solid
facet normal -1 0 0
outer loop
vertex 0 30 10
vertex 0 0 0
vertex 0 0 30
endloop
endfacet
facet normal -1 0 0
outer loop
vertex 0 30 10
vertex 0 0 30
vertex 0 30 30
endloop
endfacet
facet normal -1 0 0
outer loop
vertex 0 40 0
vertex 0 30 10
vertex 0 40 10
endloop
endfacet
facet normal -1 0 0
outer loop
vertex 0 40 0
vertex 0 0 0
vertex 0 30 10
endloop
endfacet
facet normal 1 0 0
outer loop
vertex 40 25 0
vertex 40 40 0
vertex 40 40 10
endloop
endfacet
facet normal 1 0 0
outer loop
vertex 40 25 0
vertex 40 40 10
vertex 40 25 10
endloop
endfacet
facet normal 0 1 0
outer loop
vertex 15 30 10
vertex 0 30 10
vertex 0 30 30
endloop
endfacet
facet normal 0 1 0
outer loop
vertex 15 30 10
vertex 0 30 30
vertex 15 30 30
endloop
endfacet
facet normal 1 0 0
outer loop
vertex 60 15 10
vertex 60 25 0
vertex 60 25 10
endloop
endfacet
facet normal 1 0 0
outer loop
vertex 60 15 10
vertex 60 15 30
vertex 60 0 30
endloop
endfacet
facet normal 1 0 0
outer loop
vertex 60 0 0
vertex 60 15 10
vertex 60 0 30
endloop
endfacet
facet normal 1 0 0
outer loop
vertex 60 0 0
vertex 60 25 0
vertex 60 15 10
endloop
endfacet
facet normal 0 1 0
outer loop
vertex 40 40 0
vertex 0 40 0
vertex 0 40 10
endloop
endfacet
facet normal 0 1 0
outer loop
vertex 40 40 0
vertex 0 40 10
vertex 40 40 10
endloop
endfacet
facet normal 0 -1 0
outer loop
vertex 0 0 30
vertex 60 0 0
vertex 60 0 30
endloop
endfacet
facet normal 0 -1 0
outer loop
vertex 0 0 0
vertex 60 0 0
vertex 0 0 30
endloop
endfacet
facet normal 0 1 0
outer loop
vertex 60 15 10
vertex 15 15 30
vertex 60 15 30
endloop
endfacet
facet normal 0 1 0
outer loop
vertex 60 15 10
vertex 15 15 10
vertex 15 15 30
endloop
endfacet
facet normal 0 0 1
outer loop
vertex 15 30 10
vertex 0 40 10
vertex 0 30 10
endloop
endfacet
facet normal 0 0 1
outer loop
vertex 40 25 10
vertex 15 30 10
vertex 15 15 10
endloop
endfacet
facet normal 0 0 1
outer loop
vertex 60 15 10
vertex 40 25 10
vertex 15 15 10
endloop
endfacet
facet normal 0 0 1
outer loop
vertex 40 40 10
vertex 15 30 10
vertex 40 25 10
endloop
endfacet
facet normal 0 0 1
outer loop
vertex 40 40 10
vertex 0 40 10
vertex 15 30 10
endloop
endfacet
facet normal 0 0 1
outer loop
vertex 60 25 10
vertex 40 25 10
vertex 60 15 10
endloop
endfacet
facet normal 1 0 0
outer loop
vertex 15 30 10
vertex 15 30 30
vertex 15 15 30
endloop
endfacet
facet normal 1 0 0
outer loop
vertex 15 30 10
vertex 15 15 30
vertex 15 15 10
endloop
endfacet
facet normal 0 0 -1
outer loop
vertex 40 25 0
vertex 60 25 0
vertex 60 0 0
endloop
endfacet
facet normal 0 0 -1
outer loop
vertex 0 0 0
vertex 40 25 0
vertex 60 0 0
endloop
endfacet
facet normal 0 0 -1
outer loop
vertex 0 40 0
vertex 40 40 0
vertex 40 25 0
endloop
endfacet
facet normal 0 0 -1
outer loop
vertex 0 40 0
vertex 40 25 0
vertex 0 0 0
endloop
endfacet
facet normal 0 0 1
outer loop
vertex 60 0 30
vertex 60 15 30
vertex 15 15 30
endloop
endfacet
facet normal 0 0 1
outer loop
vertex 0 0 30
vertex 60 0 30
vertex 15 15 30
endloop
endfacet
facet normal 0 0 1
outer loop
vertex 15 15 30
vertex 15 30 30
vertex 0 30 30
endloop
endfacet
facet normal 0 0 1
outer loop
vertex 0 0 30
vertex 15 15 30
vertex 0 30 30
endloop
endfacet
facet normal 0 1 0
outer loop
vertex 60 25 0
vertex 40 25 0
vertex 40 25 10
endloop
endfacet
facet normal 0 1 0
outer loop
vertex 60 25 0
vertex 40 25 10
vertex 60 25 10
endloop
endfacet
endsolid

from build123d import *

# Parameters (mm, degrees)
RESSALTO_EXTRUS_O1_DEPTH = 30
ESBO_O2_W                = 25
ESBO_O2_H                = 20
CORTE_EXTRUS_O1_DEPTH    = 25
ESBO_O3_W                = 20
ESBO_O3_H                = 20
CORTE_EXTRUS_O2_DEPTH    = 10
ESBO_O4_W                = 15
ESBO_O4_H                = 20
CORTE_EXTRUS_O3_DEPTH    = 10


with BuildPart() as part:
    # Esboço1 → Ressalto-extrusão1 (new body)
    with BuildSketch(Plane.XY):
        Polygon((0, 0), (0, 40), (40, 40), (40, 25), (60, 25), (60, 0), align=None)
    extrude(amount=RESSALTO_EXTRUS_O1_DEPTH)

    # Esboço2 → Corte-extrusão1 (cut)
    with BuildSketch(Plane(origin=(0, 40, 0), x_dir=(1, 0, 0), z_dir=(0, 1, 0))):
        with Locations((27.5, -20)):
            Rectangle(ESBO_O2_W, ESBO_O2_H)
    extrude(amount=-CORTE_EXTRUS_O1_DEPTH, mode=Mode.SUBTRACT)

    # Esboço3 → Corte-extrusão2 (cut)
    with BuildSketch(Plane(origin=(0, 25, 0), x_dir=(1, 0, 0), z_dir=(0, 1, 0))):
        with Locations((50, -20)):
            Rectangle(ESBO_O3_W, ESBO_O3_H)
    extrude(amount=-CORTE_EXTRUS_O2_DEPTH, mode=Mode.SUBTRACT)

    # Esboço4 → Corte-extrusão3 (cut)
    with BuildSketch(Plane(origin=(0, 40, 0), x_dir=(1, 0, 0), z_dir=(0, 1, 0))):
        with Locations((7.5, -20)):
            Rectangle(ESBO_O4_W, ESBO_O4_H)
    extrude(amount=-CORTE_EXTRUS_O3_DEPTH, mode=Mode.SUBTRACT)


solid = part.part
